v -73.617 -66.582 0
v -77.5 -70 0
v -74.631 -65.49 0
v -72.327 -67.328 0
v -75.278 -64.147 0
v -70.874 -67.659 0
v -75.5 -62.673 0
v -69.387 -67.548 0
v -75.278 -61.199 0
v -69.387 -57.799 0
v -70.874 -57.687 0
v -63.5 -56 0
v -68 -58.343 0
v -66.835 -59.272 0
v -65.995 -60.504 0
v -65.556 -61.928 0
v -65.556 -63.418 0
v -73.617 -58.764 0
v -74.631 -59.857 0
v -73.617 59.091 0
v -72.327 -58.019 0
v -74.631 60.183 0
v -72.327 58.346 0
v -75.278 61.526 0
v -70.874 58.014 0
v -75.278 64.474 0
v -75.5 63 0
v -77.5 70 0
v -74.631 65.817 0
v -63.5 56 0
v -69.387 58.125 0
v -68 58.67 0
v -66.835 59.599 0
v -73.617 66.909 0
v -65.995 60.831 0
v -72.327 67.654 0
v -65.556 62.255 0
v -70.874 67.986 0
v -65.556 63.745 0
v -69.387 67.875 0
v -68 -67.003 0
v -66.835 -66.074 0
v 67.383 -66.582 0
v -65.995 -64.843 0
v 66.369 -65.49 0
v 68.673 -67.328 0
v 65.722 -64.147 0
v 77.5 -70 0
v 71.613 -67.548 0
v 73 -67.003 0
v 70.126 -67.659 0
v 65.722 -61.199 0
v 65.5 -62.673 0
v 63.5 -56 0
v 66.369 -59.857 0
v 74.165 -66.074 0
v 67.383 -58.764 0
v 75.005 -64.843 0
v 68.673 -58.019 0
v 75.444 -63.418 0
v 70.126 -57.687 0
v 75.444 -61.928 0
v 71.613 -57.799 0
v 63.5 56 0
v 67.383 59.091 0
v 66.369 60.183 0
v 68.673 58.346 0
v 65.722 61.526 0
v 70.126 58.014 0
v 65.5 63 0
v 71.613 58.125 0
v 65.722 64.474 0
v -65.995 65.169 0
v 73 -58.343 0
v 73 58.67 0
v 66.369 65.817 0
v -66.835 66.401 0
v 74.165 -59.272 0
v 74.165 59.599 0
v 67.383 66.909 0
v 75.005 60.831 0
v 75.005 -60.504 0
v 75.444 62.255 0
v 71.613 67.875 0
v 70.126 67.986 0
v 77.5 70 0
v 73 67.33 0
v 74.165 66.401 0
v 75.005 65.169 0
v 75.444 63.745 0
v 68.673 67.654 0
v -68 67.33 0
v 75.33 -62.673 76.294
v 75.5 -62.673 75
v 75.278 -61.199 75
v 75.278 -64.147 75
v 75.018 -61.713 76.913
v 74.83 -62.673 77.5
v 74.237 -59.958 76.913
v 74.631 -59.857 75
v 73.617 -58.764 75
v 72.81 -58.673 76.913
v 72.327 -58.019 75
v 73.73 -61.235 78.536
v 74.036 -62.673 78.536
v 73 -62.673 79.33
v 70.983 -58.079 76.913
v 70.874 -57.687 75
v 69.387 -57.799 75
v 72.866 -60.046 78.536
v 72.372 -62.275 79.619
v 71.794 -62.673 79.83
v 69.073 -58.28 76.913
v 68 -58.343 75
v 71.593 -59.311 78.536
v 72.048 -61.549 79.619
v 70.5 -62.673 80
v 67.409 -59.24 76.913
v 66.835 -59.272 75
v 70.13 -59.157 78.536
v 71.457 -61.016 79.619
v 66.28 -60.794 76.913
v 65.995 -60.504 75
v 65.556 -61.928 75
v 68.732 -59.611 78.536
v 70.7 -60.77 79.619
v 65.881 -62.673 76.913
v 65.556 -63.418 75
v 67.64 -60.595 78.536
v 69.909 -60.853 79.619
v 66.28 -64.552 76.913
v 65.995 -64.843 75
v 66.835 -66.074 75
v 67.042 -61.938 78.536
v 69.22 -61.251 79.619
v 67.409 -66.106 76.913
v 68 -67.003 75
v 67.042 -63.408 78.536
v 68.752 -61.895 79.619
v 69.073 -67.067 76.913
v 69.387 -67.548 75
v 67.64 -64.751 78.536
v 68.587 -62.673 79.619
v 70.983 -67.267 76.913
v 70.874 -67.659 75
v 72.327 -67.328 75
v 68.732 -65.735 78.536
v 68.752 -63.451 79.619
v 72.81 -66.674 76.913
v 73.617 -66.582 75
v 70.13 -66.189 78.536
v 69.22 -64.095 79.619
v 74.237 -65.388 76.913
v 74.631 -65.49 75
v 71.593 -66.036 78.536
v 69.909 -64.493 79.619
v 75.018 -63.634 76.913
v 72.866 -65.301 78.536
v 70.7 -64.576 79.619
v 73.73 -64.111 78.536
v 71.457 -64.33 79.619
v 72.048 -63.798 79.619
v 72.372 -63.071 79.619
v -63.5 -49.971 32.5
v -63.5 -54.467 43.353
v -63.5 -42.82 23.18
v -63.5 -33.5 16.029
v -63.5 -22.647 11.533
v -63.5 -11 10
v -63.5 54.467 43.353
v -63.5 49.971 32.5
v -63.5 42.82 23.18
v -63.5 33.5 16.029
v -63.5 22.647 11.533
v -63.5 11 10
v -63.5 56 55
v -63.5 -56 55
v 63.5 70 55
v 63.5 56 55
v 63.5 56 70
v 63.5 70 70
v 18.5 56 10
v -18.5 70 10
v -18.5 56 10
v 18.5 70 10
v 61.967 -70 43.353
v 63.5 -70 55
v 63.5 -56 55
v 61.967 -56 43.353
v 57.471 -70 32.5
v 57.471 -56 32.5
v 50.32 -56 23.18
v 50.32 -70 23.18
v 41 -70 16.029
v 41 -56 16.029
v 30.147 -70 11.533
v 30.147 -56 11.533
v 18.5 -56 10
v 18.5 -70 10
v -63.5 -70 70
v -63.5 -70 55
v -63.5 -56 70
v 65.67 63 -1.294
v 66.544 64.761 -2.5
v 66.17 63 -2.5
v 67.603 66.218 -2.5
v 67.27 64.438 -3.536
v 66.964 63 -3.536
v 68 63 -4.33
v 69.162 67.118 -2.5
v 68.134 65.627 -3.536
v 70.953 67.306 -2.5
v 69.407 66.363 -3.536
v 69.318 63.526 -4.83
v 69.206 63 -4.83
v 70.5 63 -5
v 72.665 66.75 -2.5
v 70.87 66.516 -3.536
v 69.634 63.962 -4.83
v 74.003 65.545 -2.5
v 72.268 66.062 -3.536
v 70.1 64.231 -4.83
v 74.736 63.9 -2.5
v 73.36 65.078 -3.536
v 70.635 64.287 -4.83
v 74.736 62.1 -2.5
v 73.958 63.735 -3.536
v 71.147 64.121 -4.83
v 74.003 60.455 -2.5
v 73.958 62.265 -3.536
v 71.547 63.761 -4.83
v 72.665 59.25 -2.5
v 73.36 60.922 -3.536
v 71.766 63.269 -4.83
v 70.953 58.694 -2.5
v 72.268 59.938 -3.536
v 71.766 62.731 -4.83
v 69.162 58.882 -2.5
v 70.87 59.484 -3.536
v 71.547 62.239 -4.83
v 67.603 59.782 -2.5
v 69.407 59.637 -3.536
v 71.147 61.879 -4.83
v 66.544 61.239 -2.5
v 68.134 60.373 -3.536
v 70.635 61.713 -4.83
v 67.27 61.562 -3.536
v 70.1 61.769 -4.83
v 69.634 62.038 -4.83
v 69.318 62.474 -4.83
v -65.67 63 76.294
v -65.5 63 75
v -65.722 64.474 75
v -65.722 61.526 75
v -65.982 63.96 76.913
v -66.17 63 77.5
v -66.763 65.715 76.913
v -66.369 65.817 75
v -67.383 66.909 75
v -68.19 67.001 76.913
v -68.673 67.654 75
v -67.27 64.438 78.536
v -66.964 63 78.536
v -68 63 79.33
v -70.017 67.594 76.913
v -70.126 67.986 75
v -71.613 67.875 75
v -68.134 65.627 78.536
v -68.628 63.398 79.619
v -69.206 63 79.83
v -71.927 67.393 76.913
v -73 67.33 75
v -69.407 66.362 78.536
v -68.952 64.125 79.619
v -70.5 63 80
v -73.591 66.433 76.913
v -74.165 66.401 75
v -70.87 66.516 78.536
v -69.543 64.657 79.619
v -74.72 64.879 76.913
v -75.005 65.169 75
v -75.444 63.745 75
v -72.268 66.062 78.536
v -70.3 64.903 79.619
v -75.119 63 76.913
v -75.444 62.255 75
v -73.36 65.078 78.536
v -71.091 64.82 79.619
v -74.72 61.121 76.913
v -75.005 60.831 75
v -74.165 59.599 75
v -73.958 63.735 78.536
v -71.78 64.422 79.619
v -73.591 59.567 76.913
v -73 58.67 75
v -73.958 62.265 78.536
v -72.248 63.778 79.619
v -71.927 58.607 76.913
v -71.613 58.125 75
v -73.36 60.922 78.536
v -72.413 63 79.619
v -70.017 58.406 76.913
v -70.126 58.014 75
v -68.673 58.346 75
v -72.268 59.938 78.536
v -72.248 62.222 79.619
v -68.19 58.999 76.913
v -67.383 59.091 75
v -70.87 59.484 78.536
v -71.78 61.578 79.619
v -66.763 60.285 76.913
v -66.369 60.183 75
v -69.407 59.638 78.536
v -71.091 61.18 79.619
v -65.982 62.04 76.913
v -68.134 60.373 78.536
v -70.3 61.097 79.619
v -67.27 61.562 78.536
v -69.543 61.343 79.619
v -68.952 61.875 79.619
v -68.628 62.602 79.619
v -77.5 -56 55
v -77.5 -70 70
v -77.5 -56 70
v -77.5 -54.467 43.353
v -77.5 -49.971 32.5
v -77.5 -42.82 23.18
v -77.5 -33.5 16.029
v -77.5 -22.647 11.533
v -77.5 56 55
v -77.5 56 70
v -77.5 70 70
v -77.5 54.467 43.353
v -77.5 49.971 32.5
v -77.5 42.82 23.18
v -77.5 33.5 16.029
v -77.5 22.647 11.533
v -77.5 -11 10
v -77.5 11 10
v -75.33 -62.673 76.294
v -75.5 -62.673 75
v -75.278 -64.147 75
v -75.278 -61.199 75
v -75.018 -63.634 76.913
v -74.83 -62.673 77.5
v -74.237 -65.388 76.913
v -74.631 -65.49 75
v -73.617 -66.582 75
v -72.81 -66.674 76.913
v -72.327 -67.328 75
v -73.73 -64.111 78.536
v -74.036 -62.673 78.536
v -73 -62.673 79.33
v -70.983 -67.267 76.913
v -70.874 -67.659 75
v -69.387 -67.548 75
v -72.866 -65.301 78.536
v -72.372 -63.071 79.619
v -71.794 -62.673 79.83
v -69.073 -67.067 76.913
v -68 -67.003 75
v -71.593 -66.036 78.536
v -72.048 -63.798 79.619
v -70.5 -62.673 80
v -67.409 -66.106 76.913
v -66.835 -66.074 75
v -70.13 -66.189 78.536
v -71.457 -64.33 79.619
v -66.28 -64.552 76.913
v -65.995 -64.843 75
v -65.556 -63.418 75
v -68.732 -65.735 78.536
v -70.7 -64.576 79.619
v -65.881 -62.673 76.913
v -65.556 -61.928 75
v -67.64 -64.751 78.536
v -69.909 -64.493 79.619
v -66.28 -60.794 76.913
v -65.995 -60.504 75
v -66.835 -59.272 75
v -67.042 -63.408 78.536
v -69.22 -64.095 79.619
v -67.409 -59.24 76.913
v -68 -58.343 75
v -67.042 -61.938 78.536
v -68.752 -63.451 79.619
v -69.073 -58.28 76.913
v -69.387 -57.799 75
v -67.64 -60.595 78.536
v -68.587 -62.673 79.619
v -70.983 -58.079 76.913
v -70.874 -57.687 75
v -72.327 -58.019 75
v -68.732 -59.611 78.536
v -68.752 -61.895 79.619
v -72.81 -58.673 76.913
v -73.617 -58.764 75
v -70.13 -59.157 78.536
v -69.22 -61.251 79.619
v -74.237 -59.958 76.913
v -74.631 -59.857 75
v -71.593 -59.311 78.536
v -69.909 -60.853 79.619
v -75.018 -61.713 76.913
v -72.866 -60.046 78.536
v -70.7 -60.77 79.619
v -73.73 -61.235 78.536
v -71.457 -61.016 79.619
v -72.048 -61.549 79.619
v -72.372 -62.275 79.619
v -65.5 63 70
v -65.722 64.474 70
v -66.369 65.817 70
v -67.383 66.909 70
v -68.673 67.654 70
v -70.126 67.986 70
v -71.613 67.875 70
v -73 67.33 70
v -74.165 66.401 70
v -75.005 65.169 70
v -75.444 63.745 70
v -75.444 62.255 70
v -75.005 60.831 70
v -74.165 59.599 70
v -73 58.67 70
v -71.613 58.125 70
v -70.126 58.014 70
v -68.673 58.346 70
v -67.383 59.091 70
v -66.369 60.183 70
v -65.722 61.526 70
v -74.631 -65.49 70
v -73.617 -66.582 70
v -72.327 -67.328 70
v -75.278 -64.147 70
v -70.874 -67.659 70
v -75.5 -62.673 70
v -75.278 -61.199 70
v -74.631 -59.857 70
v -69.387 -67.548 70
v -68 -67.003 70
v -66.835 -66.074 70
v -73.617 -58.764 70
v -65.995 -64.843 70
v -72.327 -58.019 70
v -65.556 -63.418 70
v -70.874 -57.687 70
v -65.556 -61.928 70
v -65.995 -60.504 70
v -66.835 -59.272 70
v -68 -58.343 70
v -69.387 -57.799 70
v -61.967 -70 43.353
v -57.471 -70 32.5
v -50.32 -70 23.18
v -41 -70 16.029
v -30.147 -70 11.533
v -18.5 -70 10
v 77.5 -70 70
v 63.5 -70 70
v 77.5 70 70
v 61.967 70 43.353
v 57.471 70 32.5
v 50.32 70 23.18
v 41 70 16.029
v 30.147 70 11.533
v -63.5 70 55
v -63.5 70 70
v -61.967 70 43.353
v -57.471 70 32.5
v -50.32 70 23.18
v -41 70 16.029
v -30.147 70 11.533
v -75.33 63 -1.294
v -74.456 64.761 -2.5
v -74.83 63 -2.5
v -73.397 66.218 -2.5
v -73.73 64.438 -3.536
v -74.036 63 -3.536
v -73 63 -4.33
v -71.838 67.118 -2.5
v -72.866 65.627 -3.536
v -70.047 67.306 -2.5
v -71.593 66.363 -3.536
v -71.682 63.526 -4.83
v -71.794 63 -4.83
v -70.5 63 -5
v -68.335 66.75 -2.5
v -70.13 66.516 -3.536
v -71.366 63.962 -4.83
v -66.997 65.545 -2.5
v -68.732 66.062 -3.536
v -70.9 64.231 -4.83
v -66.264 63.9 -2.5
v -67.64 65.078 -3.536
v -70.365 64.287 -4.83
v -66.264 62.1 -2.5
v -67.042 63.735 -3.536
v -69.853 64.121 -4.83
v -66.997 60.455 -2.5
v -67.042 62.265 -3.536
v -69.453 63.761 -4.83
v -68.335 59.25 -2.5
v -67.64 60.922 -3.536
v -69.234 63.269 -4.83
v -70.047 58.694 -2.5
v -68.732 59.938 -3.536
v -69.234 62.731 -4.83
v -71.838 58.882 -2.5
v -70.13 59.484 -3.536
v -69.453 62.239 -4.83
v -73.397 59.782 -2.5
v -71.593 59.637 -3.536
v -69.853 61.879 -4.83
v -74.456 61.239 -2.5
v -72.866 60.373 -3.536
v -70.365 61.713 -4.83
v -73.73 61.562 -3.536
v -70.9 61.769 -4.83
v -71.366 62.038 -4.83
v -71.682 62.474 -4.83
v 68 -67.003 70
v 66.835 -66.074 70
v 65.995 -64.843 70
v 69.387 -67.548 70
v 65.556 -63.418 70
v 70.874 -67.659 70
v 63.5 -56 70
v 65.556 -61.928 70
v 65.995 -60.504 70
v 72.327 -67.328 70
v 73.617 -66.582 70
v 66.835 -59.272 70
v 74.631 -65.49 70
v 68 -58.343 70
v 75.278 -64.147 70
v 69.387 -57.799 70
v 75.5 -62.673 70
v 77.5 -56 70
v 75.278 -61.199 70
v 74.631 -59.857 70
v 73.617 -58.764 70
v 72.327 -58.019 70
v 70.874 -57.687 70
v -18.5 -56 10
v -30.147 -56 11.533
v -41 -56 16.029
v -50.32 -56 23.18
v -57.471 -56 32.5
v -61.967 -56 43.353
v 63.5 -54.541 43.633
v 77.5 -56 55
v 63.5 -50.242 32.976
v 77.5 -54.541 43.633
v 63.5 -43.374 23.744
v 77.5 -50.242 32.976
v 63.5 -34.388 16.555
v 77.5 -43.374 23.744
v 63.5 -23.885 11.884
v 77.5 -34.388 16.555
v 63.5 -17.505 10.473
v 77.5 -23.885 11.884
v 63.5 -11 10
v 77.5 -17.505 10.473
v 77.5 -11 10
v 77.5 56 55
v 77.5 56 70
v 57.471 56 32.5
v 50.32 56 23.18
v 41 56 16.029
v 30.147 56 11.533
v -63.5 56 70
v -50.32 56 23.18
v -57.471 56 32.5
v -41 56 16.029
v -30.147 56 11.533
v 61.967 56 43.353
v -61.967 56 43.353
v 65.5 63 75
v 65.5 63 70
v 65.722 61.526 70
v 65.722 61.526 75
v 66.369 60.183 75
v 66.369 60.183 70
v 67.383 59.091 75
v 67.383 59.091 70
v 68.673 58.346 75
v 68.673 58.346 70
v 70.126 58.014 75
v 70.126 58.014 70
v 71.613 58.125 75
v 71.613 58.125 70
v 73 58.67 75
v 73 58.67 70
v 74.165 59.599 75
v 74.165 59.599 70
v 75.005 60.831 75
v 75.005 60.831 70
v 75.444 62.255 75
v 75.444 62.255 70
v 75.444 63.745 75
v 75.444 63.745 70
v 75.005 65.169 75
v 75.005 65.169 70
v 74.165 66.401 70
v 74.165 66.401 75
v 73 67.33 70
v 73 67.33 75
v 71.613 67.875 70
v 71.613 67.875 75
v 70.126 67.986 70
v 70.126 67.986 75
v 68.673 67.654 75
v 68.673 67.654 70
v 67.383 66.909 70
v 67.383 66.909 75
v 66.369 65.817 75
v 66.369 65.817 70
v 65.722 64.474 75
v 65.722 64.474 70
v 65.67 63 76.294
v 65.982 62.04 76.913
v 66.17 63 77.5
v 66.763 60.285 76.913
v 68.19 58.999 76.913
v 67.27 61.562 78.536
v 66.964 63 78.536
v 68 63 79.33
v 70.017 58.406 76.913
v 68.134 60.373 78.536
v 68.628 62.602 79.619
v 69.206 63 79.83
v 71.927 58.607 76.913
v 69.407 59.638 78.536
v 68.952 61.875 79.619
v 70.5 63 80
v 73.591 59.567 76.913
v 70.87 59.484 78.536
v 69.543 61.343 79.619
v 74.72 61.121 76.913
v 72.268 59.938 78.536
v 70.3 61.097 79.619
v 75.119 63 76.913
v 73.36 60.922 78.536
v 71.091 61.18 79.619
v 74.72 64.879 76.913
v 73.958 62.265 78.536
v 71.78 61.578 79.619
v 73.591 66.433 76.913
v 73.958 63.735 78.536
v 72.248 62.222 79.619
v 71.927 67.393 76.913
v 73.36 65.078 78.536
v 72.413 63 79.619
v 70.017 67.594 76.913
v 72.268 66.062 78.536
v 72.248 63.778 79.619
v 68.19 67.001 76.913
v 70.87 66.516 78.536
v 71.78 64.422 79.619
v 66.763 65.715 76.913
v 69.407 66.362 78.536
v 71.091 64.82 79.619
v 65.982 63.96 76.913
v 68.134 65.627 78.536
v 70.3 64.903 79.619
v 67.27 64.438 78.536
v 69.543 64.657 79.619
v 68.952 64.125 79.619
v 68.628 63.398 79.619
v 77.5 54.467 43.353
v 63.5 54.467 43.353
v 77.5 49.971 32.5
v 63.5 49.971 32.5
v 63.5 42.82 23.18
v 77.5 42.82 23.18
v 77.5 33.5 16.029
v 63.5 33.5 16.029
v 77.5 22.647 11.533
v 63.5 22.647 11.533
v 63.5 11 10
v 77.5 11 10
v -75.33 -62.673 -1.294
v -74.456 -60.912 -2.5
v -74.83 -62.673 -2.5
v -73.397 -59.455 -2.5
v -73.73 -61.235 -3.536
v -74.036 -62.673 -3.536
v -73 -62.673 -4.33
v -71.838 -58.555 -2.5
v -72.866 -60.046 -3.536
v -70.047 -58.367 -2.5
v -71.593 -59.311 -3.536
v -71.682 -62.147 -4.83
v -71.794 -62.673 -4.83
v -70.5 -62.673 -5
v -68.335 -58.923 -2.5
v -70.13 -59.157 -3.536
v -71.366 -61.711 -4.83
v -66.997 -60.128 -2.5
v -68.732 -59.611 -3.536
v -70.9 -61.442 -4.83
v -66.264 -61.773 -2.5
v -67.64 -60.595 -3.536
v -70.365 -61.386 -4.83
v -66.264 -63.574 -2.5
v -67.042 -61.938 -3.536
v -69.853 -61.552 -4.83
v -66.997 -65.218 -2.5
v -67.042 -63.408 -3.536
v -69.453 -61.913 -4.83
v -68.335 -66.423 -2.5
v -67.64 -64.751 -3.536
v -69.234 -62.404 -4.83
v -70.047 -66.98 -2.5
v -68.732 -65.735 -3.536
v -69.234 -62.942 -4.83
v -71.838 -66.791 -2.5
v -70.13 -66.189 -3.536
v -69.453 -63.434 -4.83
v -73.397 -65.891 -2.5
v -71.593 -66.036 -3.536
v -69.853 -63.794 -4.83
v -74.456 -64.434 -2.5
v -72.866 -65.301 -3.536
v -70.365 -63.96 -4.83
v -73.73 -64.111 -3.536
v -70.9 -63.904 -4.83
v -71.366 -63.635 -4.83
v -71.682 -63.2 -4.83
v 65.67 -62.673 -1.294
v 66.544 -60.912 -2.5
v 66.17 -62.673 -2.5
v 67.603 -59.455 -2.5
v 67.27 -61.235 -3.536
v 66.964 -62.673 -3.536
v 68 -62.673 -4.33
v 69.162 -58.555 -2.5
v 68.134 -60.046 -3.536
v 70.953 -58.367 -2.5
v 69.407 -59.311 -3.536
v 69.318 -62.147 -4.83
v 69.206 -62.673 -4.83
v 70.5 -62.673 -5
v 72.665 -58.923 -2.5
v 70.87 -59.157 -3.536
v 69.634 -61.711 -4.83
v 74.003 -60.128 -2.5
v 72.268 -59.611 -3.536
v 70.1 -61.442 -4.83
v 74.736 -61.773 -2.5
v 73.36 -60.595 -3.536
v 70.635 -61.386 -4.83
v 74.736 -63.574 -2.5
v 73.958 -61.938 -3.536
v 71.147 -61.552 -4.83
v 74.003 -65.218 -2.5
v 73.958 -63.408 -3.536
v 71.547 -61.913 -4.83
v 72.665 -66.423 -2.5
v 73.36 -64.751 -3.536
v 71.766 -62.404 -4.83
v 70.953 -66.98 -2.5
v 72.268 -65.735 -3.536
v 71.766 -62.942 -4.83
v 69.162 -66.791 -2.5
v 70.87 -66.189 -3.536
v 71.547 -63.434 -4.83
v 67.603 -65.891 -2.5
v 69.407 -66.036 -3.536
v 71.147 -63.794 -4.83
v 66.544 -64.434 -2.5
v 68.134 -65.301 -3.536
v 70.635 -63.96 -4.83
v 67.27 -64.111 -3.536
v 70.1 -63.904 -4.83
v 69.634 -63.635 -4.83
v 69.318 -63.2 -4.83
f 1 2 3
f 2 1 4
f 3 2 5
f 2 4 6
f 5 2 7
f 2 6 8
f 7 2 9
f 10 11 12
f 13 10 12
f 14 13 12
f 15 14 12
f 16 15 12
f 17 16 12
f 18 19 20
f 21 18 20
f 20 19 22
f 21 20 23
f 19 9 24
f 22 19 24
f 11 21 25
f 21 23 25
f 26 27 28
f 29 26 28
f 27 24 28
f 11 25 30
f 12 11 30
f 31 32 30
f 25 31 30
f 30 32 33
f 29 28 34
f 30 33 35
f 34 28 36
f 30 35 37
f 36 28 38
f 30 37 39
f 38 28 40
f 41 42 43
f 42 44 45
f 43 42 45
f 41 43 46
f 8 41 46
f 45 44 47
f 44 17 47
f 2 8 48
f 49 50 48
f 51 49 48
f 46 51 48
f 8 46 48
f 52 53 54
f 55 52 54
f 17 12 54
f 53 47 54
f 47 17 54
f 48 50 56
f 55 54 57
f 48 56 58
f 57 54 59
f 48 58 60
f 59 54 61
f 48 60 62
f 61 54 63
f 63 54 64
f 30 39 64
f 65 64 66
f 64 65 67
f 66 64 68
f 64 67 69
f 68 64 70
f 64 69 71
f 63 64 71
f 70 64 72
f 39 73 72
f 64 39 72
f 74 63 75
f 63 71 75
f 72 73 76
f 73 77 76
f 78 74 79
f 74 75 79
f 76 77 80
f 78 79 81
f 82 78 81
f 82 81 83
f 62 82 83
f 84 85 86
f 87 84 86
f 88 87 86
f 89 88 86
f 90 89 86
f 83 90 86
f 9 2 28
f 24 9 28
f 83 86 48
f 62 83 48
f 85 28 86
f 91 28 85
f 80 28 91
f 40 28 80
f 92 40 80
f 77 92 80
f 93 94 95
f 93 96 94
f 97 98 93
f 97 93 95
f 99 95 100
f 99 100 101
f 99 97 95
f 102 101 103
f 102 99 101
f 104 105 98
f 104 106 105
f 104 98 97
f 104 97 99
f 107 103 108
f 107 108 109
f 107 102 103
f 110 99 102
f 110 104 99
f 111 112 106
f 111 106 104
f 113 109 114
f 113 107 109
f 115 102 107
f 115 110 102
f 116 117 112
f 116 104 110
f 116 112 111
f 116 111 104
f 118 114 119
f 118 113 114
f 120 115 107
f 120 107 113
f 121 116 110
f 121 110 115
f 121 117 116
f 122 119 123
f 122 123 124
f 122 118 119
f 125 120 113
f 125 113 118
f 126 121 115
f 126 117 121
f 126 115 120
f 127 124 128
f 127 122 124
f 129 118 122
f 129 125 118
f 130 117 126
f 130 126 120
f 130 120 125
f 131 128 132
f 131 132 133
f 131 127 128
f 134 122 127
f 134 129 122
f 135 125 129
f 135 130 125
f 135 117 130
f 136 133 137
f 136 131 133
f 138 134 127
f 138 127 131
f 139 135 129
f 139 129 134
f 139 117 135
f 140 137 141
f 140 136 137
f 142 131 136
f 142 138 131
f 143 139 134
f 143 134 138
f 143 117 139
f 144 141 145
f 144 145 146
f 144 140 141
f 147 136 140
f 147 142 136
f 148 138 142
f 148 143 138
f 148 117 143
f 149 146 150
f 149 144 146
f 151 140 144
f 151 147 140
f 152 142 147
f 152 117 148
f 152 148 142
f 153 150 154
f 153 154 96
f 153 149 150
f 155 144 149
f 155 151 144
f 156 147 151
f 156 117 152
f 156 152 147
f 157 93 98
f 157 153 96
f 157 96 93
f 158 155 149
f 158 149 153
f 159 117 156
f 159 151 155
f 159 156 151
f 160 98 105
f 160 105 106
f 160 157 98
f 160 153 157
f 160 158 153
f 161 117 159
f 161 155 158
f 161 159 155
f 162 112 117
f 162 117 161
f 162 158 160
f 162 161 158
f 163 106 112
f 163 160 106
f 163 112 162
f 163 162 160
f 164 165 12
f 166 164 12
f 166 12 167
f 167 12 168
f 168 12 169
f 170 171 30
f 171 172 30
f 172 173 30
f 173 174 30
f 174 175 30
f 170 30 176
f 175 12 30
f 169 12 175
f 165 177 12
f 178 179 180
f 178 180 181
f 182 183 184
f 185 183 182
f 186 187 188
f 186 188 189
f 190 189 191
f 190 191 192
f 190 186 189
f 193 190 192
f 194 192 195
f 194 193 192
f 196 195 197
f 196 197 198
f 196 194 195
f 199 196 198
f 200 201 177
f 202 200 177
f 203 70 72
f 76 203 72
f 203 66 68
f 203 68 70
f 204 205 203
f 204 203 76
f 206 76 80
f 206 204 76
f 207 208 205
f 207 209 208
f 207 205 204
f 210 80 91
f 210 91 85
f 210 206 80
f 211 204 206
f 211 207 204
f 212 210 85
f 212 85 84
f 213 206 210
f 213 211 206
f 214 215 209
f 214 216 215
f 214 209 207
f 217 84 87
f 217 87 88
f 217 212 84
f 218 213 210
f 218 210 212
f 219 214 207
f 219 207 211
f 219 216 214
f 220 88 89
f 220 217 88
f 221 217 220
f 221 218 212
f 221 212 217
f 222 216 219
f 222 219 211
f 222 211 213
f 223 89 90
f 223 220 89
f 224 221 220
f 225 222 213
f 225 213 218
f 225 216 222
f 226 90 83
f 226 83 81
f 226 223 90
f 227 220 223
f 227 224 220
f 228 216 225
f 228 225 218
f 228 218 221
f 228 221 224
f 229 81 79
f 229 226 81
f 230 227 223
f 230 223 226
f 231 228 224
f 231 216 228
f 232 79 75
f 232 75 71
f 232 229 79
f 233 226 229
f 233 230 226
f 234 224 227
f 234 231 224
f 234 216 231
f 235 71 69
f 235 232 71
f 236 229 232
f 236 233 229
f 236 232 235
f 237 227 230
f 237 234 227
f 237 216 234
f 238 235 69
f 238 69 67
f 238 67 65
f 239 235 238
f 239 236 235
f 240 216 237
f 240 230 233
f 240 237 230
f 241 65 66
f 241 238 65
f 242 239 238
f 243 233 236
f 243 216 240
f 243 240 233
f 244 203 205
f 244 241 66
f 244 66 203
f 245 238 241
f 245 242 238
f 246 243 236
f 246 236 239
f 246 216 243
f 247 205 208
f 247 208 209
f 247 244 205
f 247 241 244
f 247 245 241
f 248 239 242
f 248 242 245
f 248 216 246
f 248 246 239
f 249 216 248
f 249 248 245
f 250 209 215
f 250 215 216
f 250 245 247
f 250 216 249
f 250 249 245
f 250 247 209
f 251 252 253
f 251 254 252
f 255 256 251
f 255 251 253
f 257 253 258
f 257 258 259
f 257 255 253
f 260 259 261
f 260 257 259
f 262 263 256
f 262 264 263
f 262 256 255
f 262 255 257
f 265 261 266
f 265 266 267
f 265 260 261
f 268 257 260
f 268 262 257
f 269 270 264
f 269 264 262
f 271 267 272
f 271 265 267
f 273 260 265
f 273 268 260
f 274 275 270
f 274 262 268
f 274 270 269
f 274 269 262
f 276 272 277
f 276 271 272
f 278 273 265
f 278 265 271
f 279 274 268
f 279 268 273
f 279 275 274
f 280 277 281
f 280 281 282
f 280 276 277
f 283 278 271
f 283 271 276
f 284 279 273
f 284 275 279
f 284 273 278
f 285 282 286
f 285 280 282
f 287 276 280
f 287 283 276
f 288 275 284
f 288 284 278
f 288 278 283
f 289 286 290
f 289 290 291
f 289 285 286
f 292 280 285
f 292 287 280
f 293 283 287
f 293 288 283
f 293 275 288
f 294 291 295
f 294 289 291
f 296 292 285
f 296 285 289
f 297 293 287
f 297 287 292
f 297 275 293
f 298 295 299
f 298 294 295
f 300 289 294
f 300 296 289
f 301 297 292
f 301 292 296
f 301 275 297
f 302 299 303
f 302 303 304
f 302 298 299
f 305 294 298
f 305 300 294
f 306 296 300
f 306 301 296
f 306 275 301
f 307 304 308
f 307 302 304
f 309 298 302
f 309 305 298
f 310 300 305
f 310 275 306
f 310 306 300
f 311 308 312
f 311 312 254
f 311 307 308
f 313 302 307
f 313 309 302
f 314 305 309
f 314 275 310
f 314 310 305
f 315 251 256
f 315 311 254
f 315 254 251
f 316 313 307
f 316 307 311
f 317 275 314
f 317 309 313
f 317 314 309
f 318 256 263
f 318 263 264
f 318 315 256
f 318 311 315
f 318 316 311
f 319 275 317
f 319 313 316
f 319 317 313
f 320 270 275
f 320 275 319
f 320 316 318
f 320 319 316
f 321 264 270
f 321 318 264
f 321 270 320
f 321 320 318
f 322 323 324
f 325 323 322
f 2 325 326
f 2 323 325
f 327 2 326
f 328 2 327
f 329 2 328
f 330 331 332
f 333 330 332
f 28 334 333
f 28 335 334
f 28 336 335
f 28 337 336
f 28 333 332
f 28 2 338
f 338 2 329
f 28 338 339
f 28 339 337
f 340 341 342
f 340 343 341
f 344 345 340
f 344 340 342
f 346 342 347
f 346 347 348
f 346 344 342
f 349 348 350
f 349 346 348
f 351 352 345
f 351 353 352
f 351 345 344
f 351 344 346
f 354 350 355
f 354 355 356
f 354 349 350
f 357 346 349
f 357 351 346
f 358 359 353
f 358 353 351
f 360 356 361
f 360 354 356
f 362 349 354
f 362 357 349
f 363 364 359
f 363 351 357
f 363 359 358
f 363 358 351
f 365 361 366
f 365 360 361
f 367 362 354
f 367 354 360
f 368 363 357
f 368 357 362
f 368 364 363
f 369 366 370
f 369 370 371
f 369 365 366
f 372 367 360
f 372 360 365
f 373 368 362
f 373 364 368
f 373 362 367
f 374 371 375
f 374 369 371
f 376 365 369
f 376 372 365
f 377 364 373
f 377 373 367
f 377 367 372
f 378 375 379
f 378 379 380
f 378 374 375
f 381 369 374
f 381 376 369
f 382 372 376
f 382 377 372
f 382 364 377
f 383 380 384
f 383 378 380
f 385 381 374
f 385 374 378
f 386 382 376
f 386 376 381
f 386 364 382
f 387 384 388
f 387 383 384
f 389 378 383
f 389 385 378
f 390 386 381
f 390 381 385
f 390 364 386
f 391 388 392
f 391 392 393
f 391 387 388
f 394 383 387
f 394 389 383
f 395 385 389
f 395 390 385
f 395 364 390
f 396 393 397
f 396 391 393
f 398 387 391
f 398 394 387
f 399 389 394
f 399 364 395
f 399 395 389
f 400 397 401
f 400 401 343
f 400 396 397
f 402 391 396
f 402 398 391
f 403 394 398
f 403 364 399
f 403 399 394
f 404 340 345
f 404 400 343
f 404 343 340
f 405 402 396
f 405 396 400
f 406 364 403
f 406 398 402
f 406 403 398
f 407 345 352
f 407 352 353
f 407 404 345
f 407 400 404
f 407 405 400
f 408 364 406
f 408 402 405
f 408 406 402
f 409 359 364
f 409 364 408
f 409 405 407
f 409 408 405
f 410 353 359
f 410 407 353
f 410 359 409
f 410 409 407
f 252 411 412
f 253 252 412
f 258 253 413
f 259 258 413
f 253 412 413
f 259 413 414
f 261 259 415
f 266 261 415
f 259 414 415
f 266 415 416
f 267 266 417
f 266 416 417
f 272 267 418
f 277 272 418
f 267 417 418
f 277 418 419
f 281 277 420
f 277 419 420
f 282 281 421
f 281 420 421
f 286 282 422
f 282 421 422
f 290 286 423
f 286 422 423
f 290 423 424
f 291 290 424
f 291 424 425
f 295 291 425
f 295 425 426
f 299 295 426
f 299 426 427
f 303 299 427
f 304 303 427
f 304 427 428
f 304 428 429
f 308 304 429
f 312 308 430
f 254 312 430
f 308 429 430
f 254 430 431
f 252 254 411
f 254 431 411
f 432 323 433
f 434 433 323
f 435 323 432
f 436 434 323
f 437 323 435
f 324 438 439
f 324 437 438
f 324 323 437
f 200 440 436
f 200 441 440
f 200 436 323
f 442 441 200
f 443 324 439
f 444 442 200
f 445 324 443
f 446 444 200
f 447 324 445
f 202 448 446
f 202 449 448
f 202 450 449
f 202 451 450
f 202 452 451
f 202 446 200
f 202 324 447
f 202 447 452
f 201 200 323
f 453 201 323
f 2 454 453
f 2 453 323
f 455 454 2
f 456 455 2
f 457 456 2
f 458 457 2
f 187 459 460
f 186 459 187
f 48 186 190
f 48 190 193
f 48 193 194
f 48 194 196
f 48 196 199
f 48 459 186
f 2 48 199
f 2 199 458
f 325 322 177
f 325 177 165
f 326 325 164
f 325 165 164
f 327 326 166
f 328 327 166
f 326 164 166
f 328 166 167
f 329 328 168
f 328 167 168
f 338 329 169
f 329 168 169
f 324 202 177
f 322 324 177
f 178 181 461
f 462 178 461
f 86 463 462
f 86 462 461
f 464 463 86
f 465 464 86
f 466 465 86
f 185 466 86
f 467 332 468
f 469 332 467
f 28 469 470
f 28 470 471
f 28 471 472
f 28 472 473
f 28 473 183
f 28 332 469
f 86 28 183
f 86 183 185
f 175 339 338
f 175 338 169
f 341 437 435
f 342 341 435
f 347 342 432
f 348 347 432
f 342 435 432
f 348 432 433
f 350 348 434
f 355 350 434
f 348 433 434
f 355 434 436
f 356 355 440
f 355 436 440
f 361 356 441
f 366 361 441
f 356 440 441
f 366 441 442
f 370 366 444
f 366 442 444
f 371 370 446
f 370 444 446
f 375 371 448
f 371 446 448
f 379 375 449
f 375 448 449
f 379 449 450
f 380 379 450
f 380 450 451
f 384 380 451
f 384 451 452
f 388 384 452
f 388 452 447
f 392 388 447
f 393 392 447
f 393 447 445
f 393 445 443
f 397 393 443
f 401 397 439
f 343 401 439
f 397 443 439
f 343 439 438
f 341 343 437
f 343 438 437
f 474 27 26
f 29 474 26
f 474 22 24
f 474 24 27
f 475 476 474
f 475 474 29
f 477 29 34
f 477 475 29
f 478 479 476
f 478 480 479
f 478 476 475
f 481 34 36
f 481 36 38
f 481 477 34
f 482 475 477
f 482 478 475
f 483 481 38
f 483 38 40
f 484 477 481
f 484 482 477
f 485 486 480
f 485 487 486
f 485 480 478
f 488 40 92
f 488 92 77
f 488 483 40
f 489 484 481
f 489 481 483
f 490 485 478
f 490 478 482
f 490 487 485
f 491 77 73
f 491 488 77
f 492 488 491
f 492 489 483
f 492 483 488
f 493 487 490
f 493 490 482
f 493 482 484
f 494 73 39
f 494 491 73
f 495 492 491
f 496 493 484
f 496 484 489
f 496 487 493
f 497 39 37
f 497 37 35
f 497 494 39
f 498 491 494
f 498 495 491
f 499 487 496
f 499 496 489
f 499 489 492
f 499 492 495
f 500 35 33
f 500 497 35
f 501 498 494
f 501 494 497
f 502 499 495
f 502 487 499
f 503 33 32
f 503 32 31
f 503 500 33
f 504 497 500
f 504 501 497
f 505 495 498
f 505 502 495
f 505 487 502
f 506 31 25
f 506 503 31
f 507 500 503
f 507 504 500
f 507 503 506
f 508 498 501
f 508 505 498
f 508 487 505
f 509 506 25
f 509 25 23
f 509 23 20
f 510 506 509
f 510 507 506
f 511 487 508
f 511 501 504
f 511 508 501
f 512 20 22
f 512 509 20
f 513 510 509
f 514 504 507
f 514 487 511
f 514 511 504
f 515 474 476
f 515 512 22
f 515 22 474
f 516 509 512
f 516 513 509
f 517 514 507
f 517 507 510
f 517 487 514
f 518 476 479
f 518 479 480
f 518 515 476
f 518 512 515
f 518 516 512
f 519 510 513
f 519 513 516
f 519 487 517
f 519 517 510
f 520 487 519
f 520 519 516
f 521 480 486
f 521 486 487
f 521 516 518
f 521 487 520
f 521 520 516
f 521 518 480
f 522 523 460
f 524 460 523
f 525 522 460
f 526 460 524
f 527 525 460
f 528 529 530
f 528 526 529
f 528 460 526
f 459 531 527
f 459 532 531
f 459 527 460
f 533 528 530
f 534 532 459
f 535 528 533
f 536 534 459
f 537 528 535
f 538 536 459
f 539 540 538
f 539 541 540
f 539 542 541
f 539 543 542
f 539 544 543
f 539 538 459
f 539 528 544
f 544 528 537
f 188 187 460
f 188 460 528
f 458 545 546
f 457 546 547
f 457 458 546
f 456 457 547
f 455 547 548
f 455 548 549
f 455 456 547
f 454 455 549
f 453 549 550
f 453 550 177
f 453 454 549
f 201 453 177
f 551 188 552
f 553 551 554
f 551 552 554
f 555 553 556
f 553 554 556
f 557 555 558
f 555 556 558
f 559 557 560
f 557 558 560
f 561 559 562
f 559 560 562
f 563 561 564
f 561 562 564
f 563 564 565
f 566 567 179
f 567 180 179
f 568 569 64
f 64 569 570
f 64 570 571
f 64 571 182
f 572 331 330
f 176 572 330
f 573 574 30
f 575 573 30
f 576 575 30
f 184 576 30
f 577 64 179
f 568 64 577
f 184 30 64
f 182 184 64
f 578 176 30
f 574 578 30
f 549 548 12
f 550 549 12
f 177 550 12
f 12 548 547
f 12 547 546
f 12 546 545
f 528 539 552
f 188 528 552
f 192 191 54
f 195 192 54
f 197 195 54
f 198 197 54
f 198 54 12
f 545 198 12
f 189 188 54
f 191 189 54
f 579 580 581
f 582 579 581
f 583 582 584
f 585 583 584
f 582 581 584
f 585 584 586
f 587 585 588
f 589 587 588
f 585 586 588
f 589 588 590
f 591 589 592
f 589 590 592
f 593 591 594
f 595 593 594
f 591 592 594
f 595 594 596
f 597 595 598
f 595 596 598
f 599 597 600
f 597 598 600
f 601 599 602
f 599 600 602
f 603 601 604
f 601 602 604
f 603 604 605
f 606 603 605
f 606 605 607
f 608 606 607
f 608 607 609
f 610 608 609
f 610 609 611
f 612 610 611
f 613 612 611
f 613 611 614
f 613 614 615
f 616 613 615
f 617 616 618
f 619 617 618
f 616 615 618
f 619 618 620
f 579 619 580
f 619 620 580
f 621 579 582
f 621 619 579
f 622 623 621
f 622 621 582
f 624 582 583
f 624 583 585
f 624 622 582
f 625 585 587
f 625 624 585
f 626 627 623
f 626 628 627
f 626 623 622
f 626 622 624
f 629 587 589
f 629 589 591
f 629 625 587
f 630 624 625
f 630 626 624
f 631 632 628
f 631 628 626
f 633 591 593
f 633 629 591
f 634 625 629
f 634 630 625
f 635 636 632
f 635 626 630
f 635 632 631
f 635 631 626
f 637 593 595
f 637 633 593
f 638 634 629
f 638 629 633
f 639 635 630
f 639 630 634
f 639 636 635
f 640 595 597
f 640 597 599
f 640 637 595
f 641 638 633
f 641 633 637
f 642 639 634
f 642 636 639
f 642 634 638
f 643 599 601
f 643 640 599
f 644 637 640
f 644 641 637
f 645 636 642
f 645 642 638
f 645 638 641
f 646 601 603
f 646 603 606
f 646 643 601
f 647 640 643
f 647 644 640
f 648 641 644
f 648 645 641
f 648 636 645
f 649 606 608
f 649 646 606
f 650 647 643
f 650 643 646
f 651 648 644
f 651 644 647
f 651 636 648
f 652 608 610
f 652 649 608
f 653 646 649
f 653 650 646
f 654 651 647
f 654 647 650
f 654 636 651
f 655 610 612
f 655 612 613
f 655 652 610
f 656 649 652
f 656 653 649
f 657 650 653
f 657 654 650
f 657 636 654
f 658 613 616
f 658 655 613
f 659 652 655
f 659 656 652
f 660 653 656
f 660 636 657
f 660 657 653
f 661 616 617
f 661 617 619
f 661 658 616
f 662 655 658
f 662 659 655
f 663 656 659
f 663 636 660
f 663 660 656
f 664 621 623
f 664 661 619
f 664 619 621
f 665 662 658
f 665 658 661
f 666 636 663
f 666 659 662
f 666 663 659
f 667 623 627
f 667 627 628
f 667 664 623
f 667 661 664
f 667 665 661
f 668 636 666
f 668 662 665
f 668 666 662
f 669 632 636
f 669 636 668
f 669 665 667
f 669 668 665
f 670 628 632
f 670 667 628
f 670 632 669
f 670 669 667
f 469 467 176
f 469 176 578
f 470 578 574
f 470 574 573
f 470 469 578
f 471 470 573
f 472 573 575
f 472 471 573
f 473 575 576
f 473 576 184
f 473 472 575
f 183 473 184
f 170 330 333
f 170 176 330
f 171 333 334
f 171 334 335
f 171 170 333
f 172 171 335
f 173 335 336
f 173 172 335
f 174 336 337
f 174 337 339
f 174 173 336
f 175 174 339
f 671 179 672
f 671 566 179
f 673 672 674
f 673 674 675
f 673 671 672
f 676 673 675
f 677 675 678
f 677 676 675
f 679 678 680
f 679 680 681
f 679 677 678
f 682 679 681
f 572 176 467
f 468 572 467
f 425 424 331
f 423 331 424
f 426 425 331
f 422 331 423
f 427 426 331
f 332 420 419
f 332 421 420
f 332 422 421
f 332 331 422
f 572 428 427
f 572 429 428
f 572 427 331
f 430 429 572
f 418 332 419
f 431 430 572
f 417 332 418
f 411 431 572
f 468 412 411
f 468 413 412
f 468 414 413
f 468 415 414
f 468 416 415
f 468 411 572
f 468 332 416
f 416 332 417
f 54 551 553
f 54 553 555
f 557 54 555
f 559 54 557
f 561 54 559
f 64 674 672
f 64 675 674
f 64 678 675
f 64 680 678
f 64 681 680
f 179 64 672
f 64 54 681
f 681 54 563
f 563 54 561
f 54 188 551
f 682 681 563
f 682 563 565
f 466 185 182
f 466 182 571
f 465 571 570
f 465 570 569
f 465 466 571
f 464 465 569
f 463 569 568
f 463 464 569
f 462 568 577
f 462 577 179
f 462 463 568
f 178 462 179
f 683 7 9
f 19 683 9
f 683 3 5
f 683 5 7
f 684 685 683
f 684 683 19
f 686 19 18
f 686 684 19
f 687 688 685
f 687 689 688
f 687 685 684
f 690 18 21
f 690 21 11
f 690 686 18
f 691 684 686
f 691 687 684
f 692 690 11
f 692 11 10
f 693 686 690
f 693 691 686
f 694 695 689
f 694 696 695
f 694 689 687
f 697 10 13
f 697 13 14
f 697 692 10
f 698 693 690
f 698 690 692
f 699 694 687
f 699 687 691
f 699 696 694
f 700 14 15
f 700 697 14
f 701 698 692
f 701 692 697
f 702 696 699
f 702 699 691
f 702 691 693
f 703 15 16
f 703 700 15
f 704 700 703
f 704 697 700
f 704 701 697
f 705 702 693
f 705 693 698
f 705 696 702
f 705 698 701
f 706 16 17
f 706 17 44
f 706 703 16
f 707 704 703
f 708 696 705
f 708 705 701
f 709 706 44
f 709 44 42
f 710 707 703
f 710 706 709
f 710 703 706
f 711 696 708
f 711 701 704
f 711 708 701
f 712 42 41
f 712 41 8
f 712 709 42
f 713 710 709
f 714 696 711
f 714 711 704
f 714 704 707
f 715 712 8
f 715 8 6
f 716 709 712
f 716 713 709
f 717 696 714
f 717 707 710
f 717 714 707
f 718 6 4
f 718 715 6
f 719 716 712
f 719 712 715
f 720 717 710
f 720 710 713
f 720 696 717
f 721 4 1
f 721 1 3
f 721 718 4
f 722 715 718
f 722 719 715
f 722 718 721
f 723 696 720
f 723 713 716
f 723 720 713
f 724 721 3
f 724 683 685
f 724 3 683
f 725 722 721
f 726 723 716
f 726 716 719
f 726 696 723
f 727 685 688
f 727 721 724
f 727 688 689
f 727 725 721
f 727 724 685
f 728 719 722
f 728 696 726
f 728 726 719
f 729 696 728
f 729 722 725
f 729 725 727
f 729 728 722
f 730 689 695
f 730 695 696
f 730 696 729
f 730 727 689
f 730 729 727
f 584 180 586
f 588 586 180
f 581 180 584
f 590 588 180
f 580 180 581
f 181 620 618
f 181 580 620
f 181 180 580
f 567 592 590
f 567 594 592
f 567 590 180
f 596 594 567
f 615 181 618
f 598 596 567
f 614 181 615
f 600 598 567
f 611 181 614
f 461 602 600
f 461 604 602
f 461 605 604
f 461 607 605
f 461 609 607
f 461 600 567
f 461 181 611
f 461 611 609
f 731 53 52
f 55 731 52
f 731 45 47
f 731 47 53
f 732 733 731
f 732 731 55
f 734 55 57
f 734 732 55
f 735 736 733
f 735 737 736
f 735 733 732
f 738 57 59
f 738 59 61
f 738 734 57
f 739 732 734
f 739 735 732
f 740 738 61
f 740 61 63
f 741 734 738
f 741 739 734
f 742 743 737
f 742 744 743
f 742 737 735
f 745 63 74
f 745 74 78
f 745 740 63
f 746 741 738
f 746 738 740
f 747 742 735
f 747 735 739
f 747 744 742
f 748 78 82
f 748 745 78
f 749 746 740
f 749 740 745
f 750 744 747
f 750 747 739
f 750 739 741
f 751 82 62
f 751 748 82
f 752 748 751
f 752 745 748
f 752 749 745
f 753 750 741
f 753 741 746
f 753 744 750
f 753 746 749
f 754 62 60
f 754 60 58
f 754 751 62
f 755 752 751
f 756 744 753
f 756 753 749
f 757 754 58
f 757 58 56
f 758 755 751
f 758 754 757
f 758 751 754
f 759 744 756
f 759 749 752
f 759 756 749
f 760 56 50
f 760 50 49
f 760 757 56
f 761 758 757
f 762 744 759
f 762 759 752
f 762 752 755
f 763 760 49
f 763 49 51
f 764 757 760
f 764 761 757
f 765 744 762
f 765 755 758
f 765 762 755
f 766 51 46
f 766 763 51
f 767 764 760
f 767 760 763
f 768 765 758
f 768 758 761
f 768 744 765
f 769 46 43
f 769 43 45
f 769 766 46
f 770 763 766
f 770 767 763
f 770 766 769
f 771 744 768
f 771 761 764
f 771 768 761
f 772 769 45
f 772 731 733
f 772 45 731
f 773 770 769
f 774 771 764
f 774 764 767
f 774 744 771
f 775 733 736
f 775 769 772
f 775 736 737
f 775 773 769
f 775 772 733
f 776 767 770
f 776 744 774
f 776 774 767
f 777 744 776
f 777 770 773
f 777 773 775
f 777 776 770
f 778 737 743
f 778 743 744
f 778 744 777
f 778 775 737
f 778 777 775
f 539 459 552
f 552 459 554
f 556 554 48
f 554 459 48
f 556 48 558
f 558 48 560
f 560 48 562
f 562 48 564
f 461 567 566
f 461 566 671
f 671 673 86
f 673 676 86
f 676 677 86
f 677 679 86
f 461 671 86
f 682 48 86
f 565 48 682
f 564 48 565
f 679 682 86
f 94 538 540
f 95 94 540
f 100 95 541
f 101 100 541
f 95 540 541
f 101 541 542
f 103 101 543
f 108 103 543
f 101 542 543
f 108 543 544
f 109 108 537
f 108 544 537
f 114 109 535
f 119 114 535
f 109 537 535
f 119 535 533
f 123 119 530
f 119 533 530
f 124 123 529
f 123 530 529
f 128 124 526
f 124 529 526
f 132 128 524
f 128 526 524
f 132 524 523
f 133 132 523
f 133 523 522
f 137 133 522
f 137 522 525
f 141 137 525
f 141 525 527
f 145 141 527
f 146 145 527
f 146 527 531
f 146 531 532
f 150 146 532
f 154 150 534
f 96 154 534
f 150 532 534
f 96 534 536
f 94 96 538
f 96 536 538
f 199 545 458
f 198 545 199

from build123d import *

# Parameters (mm, degrees)
SKIZZE1_W                       = 155
SKIZZE1_H                       = 140
SKIZZE1_W_2                     = 127
SKIZZE1_H_2                     = 112
AUFSATZ_LINEAR_AUSTRAGEN1_DEPTH = 10
SKIZZE2_W                       = 14
SKIZZE2_H                       = 14
AUFSATZ_LINEAR_AUSTRAGEN2_DEPTH = 60
SKIZZE3_R                       = 5
AUFSATZ_LINEAR_AUSTRAGEN3_DEPTH = 10
VERRUNDUNG1_R                   = 5
VERRUNDUNG3_R                   = 45
VERRUNDUNG4_R                   = 45
VERRUNDUNG6_R                   = 45
VERRUNDUNG7_R                   = 45
AUFSATZ_LINEAR_START            = 5
SKIZZE9_R                       = 5
AUFSATZ_LINEAR_AUSTRAGEN4_DEPTH = 5
VERRUNDUNG8_R                   = 5


# Some blends are built 0.0001 mm under size
with BuildPart() as part:
    # Skizze1 → Aufsatz-Linear austragen1 (new body)
    with BuildSketch(Plane.XY):
        Rectangle(SKIZZE1_W, SKIZZE1_H)
        Rectangle(SKIZZE1_W_2, SKIZZE1_H_2, mode=Mode.SUBTRACT)
    extrude(amount=AUFSATZ_LINEAR_AUSTRAGEN1_DEPTH)

    # Skizze2 → Aufsatz-Linear austragen2 (add)
    with BuildSketch(Plane.XY.offset(10)):
        with Locations((-70.5, 63)):
            Rectangle(SKIZZE2_W, SKIZZE2_H)
        with Locations((70.5, 63)):
            Rectangle(SKIZZE2_W, SKIZZE2_H)
        with Locations((70.5, -63)):
            Rectangle(SKIZZE2_W, SKIZZE2_H)
        with Locations((-70.5, -63)):
            Rectangle(SKIZZE2_W, SKIZZE2_H)
    extrude(amount=AUFSATZ_LINEAR_AUSTRAGEN2_DEPTH)

    # Skizze3 → Aufsatz-Linear austragen3 (add)
    with BuildSketch(Plane.XY.offset(70)):
        with Locations(Location((-70.5, -62.673227844, 0), (0, 0, 180))):
            Circle(SKIZZE3_R)
        with Locations((70.5, -62.673227844)):
            Circle(SKIZZE3_R)
        with Locations(Location((70.5, 63, 0), (0, 0, 180))):
            Circle(SKIZZE3_R)
        with Locations((-70.5, 63)):
            Circle(SKIZZE3_R)
    extrude(amount=AUFSATZ_LINEAR_AUSTRAGEN3_DEPTH)

    # Verrundung1
    verrundung1_edges = [part.edges().sort_by_distance(p)[0] for p in [
        (-65.5, -62.673227844, 80),
        (65.5, -62.673227844, 80),
        (75.5, 63, 80),
        (-75.5, 63, 80),
    ]]
    fillet(verrundung1_edges, radius=VERRUNDUNG1_R)

    # Verrundung3
    # the kernel refuses this fillet: 45 mm, written as the material it adds along each edge
    with BuildSketch(Plane(origin=(-63.5, -70, 10), x_dir=(0, 0, 1), z_dir=(0, 1, 0))) as verrundung3_piece_1:
        with BuildLine():
            CenterArc((VERRUNDUNG3_R, VERRUNDUNG3_R), VERRUNDUNG3_R, 180, 90)
            Line((0, VERRUNDUNG3_R), (0, 0))
            Line((0, 0), (VERRUNDUNG3_R, 0))
        make_face()
    extrude(amount=14)

    # Verrundung4
    verrundung4_edges = [part.edges().sort_by_distance(p)[0] for p in [
        (-70.5, -56, 10),
    ]]
    fillet(verrundung4_edges, radius=VERRUNDUNG4_R - 0.0001)  # a hair under: the kernel refuses the full size

    # Verrundung6
    # the kernel refuses this fillet: 45 mm, written as the material it adds along each edge
    with BuildSketch(Plane(origin=(-63.5, 70, 10), x_dir=(0, 0, 1), z_dir=(0, -1, 0)), Plane(origin=(63.5, 70, 10), x_dir=(-1, 0, 0), z_dir=(0, -1, 0)), Plane(origin=(63.5, -70, 10), x_dir=(0, 0, 1), z_dir=(0, 1, 0))) as verrundung6_piece_1:
        with BuildLine():
            CenterArc((VERRUNDUNG6_R, -VERRUNDUNG6_R), VERRUNDUNG6_R, 90, 90)
            Line((0, -VERRUNDUNG6_R), (0, 0))
            Line((0, 0), (VERRUNDUNG6_R, 0))
        make_face()
    extrude(amount=14)
    with BuildSketch(Plane(origin=(-63.5, 70, 10), x_dir=(0, 0, 1), z_dir=(0, -1, 0))) as verrundung6_piece_2_section:
        with BuildLine():
            CenterArc((VERRUNDUNG6_R, -VERRUNDUNG6_R), VERRUNDUNG6_R, 90, 90)
            Line((0, -VERRUNDUNG6_R), (0, 0))
            Line((0, 0), (VERRUNDUNG6_R, 0))
        make_face()
    verrundung6_piece_2 = extrude(amount=126.5, mode=Mode.PRIVATE)
    verrundung6_piece_2 = split(verrundung6_piece_2, bisect_by=Plane(origin=(-53.312219858, -56, 20.187780141), z_dir=(0, -1, 0)), keep=Keep.TOP, mode=Mode.PRIVATE)
    add(verrundung6_piece_2)
    with BuildSketch(Plane(origin=(63.5, 70, 10), x_dir=(-1, 0, 0), z_dir=(0, -1, 0))) as verrundung6_piece_3_section:
        with BuildLine():
            CenterArc((VERRUNDUNG6_R, -VERRUNDUNG6_R), VERRUNDUNG6_R, 90, 90)
            Line((0, -VERRUNDUNG6_R), (0, 0))
            Line((0, 0), (VERRUNDUNG6_R, 0))
        make_face()
    verrundung6_piece_3 = extrude(amount=126.5, mode=Mode.PRIVATE)
    verrundung6_piece_3 = split(verrundung6_piece_3, bisect_by=Plane(origin=(53.312219858, -56, 20.187780142), z_dir=(0, -1, 0)), keep=Keep.TOP, mode=Mode.PRIVATE)
    add(verrundung6_piece_3)
    with BuildSketch(Plane(origin=(63.5, -70, 10), x_dir=(0, 0, 1), z_dir=(0, 1, 0))) as verrundung6_piece_4_section:
        with BuildLine():
            CenterArc((VERRUNDUNG6_R, -VERRUNDUNG6_R), VERRUNDUNG6_R, 90, 90)
            Line((0, -VERRUNDUNG6_R), (0, 0))
            Line((0, 0), (VERRUNDUNG6_R, 0))
        make_face()
    verrundung6_piece_4 = extrude(amount=126.5, mode=Mode.PRIVATE)
    verrundung6_piece_4 = split(verrundung6_piece_4, bisect_by=Plane(origin=(53.312219858, 56, 20.187780142), z_dir=(0, 1, 0)), keep=Keep.TOP, mode=Mode.PRIVATE)
    add(verrundung6_piece_4)

    # Verrundung7
    verrundung7_edges = [part.edges().sort_by_distance(p)[0] for p in [
        (-70.5, 56, 10),
        (70.5, 56, 10),
        (70.5, -56, 10),
    ]]
    fillet(verrundung7_edges, radius=VERRUNDUNG7_R)

    # Skizze9 → Aufsatz-Linear austragen4 (add)
    with BuildSketch(Plane(origin=(0, 0, 0), x_dir=(-1, 0, 0), z_dir=(0, 0, -1)).offset(AUFSATZ_LINEAR_START)):
        with Locations((70.5, -62.673227844)):
            Circle(SKIZZE9_R)
        with Locations((70.5, 63)):
            Circle(SKIZZE9_R)
        with Locations((-70.5, 63)):
            Circle(SKIZZE9_R)
        with Locations((-70.5, -62.673227844)):
            Circle(SKIZZE9_R)
    extrude(amount=-AUFSATZ_LINEAR_AUSTRAGEN4_DEPTH)

    # Verrundung8
    verrundung8_edges = [part.edges().sort_by_distance(p)[0] for p in [
        (-65.5, -62.673227844, -5),
        (-65.5, 63, -5),
        (75.5, 63, -5),
        (75.5, -62.673227844, -5),
    ]]
    fillet(verrundung8_edges, radius=VERRUNDUNG8_R - 0.0001)  # a hair under: the kernel refuses the full size


solid = part.part
